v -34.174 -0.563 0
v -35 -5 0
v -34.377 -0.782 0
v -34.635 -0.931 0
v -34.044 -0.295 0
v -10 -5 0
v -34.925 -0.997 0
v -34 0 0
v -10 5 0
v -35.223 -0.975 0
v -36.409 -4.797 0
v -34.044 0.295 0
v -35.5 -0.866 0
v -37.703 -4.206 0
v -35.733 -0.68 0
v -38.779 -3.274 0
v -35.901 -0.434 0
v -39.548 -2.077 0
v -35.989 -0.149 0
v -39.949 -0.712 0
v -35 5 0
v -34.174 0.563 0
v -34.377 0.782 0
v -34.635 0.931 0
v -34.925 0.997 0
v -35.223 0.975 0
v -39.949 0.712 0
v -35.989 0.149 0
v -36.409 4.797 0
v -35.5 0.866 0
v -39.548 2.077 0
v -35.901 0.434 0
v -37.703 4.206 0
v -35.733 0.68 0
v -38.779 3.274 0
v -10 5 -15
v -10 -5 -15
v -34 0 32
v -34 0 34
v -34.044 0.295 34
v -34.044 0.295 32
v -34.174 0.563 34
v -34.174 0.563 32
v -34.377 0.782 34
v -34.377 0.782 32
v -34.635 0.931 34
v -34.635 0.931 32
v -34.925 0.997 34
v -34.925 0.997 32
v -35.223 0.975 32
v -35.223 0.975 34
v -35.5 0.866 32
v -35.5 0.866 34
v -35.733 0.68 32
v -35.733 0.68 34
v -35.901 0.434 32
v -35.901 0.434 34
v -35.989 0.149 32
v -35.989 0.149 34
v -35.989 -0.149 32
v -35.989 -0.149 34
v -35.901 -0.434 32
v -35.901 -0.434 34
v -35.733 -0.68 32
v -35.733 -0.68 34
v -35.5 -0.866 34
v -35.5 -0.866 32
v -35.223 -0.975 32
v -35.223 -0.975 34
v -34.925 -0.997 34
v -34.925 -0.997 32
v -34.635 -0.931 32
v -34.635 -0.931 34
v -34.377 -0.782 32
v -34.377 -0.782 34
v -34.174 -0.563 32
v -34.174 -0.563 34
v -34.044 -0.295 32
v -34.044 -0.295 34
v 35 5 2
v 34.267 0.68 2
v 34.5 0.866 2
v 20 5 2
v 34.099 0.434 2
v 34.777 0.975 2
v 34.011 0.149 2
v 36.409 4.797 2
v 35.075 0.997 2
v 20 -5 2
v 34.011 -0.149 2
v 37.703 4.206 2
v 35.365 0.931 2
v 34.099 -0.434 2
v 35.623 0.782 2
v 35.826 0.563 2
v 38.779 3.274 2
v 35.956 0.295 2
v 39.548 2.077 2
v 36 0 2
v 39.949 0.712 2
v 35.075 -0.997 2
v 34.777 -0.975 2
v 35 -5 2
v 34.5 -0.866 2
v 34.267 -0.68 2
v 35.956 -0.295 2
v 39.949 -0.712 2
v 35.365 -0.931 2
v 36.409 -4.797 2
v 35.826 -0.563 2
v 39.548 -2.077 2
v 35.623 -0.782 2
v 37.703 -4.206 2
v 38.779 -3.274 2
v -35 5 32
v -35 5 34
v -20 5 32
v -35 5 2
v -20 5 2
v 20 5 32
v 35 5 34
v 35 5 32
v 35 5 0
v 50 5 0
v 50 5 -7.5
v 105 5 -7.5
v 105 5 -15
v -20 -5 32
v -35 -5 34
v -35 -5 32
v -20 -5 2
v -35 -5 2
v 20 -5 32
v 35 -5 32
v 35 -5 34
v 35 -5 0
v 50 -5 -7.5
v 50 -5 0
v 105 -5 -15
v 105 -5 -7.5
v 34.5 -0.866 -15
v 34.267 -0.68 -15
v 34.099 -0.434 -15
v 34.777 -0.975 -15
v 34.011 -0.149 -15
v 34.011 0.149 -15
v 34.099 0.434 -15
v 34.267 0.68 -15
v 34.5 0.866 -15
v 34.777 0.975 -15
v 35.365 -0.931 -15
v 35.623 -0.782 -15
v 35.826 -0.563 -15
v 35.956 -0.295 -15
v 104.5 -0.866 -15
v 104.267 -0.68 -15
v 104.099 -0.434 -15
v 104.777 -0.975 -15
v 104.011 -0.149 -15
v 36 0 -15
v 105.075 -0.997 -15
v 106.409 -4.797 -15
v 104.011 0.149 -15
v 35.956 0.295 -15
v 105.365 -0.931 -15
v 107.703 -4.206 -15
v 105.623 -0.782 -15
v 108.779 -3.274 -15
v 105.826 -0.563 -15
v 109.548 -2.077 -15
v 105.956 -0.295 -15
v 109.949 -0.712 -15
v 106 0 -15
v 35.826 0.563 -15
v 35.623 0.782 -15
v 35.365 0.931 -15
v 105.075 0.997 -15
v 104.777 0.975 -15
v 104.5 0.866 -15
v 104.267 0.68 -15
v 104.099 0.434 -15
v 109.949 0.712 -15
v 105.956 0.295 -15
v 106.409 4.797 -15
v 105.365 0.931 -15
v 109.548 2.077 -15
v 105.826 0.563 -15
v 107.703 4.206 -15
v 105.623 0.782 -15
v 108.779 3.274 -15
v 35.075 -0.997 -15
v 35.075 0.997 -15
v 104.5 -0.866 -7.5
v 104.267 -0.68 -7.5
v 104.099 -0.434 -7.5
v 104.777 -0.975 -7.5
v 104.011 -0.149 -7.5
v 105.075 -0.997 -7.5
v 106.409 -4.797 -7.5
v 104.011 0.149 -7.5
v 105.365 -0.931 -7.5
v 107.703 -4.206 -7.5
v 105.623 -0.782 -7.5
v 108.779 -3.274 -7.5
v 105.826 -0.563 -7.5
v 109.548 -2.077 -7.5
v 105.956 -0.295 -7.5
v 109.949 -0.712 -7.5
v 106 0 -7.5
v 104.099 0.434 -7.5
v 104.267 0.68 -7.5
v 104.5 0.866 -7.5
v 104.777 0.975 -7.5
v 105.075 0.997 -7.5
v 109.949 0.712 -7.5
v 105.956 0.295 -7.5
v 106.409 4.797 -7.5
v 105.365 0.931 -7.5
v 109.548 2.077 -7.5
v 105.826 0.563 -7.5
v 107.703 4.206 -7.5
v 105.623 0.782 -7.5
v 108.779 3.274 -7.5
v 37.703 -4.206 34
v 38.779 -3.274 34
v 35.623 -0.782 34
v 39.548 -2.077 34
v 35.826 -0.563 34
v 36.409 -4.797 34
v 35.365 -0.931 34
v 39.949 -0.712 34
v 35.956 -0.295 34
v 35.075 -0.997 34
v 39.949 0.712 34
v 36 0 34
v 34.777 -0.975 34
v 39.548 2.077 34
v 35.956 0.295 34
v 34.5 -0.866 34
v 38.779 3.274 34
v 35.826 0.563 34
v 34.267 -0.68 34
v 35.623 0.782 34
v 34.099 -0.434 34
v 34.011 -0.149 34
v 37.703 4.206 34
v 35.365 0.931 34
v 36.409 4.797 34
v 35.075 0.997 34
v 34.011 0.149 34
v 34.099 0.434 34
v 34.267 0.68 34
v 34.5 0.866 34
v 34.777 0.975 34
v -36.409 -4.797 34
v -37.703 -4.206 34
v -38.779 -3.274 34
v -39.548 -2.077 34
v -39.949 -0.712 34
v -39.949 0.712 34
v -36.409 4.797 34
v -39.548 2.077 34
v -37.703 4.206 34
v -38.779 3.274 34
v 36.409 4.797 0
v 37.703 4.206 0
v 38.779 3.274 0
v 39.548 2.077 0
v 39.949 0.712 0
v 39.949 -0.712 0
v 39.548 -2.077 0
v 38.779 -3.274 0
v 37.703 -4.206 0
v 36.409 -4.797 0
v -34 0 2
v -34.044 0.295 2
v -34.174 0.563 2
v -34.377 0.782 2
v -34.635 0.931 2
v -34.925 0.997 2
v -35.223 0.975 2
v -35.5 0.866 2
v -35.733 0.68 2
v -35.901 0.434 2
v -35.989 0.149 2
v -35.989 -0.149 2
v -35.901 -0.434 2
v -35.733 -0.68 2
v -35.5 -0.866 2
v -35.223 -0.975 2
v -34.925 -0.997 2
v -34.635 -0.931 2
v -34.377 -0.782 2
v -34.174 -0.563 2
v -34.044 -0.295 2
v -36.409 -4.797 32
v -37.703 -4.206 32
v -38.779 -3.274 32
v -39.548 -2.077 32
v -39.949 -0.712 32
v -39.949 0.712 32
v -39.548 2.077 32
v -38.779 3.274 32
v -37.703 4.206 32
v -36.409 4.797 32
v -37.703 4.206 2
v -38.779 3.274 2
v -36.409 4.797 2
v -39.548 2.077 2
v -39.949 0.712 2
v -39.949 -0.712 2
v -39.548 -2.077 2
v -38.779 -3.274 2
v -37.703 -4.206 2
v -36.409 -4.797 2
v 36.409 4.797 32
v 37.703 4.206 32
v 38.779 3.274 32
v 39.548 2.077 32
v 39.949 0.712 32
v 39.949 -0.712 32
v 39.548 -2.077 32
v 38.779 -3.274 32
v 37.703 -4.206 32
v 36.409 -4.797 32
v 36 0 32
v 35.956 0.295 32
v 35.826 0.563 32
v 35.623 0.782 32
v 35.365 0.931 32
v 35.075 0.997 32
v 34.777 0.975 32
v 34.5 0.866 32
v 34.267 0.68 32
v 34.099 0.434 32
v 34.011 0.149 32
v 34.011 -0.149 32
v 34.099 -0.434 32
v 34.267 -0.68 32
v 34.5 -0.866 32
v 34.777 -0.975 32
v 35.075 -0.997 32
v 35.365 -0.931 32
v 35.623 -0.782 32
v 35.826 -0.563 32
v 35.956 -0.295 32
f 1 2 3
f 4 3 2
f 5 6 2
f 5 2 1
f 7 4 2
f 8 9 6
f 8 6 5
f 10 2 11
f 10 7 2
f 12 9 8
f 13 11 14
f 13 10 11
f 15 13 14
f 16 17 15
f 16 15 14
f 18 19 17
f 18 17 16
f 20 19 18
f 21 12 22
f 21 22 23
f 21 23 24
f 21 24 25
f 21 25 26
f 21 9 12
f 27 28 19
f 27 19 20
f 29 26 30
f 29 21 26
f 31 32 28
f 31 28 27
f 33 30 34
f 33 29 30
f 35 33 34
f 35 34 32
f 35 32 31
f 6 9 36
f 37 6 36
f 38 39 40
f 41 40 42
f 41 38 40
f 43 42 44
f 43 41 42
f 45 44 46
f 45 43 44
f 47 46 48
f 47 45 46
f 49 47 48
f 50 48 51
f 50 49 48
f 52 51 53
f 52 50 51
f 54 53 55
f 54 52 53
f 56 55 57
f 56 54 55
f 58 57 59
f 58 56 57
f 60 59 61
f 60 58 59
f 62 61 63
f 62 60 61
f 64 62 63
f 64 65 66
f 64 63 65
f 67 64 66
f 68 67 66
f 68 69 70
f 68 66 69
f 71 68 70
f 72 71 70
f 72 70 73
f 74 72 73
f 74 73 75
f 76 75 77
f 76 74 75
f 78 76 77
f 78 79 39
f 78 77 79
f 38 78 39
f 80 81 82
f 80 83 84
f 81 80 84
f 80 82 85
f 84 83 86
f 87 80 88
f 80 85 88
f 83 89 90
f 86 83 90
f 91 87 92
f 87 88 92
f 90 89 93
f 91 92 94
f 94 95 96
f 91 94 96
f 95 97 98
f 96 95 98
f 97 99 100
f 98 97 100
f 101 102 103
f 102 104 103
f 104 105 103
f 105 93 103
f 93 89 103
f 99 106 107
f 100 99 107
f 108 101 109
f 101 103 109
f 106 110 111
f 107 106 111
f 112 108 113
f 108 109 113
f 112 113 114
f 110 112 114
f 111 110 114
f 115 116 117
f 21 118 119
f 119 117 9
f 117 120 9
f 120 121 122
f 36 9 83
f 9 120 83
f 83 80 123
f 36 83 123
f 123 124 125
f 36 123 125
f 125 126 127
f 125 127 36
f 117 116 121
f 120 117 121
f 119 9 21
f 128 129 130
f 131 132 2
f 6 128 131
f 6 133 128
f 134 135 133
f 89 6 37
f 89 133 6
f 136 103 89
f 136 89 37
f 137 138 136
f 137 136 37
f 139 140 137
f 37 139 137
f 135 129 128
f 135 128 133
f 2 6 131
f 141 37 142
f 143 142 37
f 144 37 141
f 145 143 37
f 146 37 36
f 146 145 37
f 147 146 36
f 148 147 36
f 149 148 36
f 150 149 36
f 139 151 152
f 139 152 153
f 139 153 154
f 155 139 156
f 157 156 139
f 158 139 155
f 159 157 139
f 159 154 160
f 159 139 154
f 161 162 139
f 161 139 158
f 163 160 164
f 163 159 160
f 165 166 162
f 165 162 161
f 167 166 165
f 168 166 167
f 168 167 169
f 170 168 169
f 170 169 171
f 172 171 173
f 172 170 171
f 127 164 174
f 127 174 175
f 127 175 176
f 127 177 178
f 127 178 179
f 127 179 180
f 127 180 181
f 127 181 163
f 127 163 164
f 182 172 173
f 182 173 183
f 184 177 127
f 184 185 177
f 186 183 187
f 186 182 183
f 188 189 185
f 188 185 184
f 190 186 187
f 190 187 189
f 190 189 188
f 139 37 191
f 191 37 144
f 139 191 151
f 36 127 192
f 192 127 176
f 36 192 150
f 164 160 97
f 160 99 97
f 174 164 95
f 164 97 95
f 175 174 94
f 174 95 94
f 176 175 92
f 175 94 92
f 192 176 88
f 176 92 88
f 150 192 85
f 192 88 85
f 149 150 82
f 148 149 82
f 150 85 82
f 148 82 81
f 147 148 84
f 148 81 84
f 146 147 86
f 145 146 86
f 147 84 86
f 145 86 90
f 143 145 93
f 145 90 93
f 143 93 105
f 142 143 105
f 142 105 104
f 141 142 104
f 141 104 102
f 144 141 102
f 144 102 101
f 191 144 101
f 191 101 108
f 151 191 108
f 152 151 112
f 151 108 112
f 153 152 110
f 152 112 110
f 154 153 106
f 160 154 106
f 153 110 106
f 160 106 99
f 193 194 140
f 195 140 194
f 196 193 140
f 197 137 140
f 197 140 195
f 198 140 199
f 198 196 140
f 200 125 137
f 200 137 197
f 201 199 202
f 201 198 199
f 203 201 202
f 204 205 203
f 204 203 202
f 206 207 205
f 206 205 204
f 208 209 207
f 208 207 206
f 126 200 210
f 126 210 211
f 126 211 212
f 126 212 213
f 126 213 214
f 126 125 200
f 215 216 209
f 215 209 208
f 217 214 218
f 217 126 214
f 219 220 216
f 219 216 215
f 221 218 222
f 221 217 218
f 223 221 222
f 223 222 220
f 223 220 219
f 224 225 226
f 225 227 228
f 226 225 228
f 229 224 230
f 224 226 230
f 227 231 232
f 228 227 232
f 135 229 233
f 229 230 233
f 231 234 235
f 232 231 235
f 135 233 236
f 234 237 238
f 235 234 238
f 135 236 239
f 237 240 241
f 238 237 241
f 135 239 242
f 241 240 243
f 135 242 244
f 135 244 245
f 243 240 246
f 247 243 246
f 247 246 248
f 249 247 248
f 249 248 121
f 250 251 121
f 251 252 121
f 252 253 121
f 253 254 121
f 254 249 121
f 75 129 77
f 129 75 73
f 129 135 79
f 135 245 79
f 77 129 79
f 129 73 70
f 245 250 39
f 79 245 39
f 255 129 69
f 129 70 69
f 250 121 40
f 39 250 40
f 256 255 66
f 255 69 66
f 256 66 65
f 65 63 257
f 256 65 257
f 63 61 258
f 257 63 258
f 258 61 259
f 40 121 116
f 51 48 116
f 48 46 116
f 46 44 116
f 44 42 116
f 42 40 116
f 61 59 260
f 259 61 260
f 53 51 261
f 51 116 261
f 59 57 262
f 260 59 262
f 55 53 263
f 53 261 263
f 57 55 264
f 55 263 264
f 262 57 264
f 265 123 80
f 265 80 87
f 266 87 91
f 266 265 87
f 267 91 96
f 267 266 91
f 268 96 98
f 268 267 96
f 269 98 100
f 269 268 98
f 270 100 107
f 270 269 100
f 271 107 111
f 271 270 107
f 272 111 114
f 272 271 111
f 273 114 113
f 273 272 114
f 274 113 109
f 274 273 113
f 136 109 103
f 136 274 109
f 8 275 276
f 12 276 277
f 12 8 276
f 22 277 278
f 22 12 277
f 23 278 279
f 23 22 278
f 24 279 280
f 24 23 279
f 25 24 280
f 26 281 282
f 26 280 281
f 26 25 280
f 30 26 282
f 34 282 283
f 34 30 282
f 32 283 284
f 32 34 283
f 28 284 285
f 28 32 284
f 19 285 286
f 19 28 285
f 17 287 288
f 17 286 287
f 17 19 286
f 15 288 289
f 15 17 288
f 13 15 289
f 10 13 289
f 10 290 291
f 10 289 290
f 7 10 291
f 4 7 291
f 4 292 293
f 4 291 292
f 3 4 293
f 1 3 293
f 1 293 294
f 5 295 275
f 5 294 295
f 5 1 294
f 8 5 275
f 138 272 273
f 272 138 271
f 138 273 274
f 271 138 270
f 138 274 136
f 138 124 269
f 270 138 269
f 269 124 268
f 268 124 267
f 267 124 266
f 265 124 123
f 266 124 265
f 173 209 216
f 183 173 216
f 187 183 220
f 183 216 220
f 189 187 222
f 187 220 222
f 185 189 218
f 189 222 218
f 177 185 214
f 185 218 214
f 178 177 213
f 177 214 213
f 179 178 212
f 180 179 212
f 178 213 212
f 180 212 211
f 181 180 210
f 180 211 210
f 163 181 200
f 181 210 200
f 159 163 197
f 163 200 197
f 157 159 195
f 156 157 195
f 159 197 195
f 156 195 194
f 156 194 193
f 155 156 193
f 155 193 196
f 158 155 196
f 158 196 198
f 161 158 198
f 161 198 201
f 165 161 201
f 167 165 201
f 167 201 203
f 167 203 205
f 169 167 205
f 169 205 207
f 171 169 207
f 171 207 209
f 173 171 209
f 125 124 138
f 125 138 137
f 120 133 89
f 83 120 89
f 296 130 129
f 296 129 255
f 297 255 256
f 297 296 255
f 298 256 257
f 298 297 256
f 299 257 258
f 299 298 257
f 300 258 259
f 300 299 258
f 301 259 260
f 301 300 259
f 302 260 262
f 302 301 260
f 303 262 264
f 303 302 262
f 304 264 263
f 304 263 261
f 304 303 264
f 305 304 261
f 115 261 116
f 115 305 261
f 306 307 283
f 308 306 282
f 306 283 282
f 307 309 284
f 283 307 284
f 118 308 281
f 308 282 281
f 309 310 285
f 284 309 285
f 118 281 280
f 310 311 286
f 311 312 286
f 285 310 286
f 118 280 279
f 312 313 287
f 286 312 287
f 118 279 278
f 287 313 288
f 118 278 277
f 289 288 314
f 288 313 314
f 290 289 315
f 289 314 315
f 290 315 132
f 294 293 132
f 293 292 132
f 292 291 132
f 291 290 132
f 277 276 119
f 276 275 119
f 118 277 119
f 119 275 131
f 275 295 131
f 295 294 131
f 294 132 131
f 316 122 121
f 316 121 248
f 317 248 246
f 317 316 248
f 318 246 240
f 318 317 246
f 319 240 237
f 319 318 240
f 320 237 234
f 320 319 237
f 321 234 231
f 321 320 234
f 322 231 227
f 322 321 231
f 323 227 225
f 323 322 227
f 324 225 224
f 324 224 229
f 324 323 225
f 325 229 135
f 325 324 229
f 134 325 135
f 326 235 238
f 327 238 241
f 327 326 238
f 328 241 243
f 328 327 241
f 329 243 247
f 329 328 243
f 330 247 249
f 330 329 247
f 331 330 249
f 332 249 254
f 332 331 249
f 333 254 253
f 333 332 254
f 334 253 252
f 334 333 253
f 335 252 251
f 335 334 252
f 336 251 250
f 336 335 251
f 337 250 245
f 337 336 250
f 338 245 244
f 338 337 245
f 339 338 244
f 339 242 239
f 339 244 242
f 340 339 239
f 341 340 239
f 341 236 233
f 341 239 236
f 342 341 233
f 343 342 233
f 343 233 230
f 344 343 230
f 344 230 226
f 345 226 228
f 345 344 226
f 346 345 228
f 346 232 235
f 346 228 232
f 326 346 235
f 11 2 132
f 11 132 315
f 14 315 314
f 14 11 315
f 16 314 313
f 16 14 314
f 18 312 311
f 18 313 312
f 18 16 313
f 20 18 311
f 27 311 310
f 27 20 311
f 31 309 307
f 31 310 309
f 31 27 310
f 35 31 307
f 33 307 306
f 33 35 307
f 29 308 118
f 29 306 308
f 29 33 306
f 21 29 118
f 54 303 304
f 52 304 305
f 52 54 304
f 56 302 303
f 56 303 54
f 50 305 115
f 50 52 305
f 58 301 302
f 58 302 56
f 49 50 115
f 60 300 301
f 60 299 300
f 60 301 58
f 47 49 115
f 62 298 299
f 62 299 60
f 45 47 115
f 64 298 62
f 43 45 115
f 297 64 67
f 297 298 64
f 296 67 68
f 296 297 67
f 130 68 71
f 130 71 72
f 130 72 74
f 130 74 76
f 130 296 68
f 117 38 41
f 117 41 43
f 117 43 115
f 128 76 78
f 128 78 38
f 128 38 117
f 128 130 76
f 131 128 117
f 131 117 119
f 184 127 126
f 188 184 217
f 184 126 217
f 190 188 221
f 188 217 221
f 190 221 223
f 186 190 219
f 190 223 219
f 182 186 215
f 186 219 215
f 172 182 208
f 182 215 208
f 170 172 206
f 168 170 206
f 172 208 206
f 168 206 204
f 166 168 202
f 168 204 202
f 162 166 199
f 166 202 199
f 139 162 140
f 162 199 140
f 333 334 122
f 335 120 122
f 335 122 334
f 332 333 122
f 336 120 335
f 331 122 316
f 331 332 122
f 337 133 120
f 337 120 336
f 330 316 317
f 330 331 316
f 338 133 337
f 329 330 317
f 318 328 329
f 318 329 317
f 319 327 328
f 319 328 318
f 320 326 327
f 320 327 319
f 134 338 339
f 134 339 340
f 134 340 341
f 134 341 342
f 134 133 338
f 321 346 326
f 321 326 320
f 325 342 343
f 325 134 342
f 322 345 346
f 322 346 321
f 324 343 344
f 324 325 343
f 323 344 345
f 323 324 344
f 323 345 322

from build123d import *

# Parameters (mm, degrees)
EXTRUDE_1_DEPTH          = 34
SKETCH_2_R               = 1
CUT_EXTRUDE_4_DEPTH      = 35
CUT_EXTRUDE_4_DEPTH_BACK = 30
SKETCH_3_W               = 20
SKETCH_3_H               = 30
CUT_EXTRUDE_5_DEPTH      = 30
CUT_EXTRUDE_5_DEPTH_BACK = 30
EXTRUDE_4_DEPTH          = 15
SKETCH_5_R               = 1
CUT_EXTRUDE_7_DEPTH      = 16
SKETCH_6_W               = 15
SKETCH_6_H               = 10
EXTRUDE_5_DEPTH          = 10
SKETCH_7_W               = 70
SKETCH_7_H               = 10
CUT_EXTRUDE_8_DEPTH      = 10
CUT_EXTRUDE_8_DEPTH_BACK = 10


with BuildPart() as part:
    # 草圖1 → 填料-伸長1 (new body)
    with BuildSketch(Plane.XY):
        with BuildLine():
            Line((-35, 5), (35, 5))
            ThreePointArc((35, 5), (40, 0), (35, -5))
            Line((35, -5), (-35, -5))
            ThreePointArc((-35, -5), (-40, 0), (-35, 5))
        make_face()
    extrude(amount=EXTRUDE_1_DEPTH)

    # 草圖2 → 除料-伸長4 (cut, two sides)
    with BuildSketch(Plane.XY) as cut_extrude_4_sk:
        with Locations((-35, 0)):
            Circle(SKETCH_2_R)
        with Locations((35, 0)):
            Circle(SKETCH_2_R)
    extrude(amount=CUT_EXTRUDE_4_DEPTH, mode=Mode.SUBTRACT)
    extrude(cut_extrude_4_sk.sketch, amount=-CUT_EXTRUDE_4_DEPTH_BACK, mode=Mode.SUBTRACT)

    # 草圖3 → 除料-伸長5 (cut, two sides)
    with BuildSketch(Plane(origin=(0, 0, 0), x_dir=(1, 0, 0), z_dir=(0, 1, 0))) as cut_extrude_5_sk:
        with Locations((-30, -17)):
            Rectangle(SKETCH_3_W, SKETCH_3_H)
        with Locations((30, -17)):
            Rectangle(SKETCH_3_W, SKETCH_3_H)
    extrude(amount=CUT_EXTRUDE_5_DEPTH, mode=Mode.SUBTRACT)
    extrude(cut_extrude_5_sk.sketch, amount=-CUT_EXTRUDE_5_DEPTH_BACK, mode=Mode.SUBTRACT)

    # 草圖4 → 填料-伸長4 (add)
    with BuildSketch(Plane.XY):
        with BuildLine():
            Line((0, 5), (105, 5))
            ThreePointArc((105, 5), (110, 0), (105, -5))
            Line((105, -5), (0, -5))
            Line((0, -5), (0, 5))
        make_face()
    extrude(amount=-EXTRUDE_4_DEPTH)

    # 草圖5 → 除料-伸長7 (cut, through all)
    with BuildSketch(Plane.XY):
        with Locations((35, 0)):
            Circle(SKETCH_5_R)
        with Locations((105, 0)):
            Circle(SKETCH_5_R)
    extrude(amount=-CUT_EXTRUDE_7_DEPTH, mode=Mode.SUBTRACT)

    # 草圖6 → 填料-伸長5 (add)
    with BuildSketch(Plane(origin=(0, 0, 0), x_dir=(0, 0, -1), z_dir=(1, 0, 0))):
        with Locations((7.5, 0)):
            Rectangle(SKETCH_6_W, SKETCH_6_H)
    extrude(amount=-EXTRUDE_5_DEPTH)

    # 草圖7 → 除料-伸長8 (cut, two sides)
    with BuildSketch(Plane(origin=(0, 0, 0), x_dir=(1, 0, 0), z_dir=(0, 1, 0))) as cut_extrude_8_sk:
        with Locations((85, 2.5)):
            Rectangle(SKETCH_7_W, SKETCH_7_H)
    extrude(amount=CUT_EXTRUDE_8_DEPTH, mode=Mode.SUBTRACT)
    extrude(cut_extrude_8_sk.sketch, amount=-CUT_EXTRUDE_8_DEPTH_BACK, mode=Mode.SUBTRACT)


solid = part.part
